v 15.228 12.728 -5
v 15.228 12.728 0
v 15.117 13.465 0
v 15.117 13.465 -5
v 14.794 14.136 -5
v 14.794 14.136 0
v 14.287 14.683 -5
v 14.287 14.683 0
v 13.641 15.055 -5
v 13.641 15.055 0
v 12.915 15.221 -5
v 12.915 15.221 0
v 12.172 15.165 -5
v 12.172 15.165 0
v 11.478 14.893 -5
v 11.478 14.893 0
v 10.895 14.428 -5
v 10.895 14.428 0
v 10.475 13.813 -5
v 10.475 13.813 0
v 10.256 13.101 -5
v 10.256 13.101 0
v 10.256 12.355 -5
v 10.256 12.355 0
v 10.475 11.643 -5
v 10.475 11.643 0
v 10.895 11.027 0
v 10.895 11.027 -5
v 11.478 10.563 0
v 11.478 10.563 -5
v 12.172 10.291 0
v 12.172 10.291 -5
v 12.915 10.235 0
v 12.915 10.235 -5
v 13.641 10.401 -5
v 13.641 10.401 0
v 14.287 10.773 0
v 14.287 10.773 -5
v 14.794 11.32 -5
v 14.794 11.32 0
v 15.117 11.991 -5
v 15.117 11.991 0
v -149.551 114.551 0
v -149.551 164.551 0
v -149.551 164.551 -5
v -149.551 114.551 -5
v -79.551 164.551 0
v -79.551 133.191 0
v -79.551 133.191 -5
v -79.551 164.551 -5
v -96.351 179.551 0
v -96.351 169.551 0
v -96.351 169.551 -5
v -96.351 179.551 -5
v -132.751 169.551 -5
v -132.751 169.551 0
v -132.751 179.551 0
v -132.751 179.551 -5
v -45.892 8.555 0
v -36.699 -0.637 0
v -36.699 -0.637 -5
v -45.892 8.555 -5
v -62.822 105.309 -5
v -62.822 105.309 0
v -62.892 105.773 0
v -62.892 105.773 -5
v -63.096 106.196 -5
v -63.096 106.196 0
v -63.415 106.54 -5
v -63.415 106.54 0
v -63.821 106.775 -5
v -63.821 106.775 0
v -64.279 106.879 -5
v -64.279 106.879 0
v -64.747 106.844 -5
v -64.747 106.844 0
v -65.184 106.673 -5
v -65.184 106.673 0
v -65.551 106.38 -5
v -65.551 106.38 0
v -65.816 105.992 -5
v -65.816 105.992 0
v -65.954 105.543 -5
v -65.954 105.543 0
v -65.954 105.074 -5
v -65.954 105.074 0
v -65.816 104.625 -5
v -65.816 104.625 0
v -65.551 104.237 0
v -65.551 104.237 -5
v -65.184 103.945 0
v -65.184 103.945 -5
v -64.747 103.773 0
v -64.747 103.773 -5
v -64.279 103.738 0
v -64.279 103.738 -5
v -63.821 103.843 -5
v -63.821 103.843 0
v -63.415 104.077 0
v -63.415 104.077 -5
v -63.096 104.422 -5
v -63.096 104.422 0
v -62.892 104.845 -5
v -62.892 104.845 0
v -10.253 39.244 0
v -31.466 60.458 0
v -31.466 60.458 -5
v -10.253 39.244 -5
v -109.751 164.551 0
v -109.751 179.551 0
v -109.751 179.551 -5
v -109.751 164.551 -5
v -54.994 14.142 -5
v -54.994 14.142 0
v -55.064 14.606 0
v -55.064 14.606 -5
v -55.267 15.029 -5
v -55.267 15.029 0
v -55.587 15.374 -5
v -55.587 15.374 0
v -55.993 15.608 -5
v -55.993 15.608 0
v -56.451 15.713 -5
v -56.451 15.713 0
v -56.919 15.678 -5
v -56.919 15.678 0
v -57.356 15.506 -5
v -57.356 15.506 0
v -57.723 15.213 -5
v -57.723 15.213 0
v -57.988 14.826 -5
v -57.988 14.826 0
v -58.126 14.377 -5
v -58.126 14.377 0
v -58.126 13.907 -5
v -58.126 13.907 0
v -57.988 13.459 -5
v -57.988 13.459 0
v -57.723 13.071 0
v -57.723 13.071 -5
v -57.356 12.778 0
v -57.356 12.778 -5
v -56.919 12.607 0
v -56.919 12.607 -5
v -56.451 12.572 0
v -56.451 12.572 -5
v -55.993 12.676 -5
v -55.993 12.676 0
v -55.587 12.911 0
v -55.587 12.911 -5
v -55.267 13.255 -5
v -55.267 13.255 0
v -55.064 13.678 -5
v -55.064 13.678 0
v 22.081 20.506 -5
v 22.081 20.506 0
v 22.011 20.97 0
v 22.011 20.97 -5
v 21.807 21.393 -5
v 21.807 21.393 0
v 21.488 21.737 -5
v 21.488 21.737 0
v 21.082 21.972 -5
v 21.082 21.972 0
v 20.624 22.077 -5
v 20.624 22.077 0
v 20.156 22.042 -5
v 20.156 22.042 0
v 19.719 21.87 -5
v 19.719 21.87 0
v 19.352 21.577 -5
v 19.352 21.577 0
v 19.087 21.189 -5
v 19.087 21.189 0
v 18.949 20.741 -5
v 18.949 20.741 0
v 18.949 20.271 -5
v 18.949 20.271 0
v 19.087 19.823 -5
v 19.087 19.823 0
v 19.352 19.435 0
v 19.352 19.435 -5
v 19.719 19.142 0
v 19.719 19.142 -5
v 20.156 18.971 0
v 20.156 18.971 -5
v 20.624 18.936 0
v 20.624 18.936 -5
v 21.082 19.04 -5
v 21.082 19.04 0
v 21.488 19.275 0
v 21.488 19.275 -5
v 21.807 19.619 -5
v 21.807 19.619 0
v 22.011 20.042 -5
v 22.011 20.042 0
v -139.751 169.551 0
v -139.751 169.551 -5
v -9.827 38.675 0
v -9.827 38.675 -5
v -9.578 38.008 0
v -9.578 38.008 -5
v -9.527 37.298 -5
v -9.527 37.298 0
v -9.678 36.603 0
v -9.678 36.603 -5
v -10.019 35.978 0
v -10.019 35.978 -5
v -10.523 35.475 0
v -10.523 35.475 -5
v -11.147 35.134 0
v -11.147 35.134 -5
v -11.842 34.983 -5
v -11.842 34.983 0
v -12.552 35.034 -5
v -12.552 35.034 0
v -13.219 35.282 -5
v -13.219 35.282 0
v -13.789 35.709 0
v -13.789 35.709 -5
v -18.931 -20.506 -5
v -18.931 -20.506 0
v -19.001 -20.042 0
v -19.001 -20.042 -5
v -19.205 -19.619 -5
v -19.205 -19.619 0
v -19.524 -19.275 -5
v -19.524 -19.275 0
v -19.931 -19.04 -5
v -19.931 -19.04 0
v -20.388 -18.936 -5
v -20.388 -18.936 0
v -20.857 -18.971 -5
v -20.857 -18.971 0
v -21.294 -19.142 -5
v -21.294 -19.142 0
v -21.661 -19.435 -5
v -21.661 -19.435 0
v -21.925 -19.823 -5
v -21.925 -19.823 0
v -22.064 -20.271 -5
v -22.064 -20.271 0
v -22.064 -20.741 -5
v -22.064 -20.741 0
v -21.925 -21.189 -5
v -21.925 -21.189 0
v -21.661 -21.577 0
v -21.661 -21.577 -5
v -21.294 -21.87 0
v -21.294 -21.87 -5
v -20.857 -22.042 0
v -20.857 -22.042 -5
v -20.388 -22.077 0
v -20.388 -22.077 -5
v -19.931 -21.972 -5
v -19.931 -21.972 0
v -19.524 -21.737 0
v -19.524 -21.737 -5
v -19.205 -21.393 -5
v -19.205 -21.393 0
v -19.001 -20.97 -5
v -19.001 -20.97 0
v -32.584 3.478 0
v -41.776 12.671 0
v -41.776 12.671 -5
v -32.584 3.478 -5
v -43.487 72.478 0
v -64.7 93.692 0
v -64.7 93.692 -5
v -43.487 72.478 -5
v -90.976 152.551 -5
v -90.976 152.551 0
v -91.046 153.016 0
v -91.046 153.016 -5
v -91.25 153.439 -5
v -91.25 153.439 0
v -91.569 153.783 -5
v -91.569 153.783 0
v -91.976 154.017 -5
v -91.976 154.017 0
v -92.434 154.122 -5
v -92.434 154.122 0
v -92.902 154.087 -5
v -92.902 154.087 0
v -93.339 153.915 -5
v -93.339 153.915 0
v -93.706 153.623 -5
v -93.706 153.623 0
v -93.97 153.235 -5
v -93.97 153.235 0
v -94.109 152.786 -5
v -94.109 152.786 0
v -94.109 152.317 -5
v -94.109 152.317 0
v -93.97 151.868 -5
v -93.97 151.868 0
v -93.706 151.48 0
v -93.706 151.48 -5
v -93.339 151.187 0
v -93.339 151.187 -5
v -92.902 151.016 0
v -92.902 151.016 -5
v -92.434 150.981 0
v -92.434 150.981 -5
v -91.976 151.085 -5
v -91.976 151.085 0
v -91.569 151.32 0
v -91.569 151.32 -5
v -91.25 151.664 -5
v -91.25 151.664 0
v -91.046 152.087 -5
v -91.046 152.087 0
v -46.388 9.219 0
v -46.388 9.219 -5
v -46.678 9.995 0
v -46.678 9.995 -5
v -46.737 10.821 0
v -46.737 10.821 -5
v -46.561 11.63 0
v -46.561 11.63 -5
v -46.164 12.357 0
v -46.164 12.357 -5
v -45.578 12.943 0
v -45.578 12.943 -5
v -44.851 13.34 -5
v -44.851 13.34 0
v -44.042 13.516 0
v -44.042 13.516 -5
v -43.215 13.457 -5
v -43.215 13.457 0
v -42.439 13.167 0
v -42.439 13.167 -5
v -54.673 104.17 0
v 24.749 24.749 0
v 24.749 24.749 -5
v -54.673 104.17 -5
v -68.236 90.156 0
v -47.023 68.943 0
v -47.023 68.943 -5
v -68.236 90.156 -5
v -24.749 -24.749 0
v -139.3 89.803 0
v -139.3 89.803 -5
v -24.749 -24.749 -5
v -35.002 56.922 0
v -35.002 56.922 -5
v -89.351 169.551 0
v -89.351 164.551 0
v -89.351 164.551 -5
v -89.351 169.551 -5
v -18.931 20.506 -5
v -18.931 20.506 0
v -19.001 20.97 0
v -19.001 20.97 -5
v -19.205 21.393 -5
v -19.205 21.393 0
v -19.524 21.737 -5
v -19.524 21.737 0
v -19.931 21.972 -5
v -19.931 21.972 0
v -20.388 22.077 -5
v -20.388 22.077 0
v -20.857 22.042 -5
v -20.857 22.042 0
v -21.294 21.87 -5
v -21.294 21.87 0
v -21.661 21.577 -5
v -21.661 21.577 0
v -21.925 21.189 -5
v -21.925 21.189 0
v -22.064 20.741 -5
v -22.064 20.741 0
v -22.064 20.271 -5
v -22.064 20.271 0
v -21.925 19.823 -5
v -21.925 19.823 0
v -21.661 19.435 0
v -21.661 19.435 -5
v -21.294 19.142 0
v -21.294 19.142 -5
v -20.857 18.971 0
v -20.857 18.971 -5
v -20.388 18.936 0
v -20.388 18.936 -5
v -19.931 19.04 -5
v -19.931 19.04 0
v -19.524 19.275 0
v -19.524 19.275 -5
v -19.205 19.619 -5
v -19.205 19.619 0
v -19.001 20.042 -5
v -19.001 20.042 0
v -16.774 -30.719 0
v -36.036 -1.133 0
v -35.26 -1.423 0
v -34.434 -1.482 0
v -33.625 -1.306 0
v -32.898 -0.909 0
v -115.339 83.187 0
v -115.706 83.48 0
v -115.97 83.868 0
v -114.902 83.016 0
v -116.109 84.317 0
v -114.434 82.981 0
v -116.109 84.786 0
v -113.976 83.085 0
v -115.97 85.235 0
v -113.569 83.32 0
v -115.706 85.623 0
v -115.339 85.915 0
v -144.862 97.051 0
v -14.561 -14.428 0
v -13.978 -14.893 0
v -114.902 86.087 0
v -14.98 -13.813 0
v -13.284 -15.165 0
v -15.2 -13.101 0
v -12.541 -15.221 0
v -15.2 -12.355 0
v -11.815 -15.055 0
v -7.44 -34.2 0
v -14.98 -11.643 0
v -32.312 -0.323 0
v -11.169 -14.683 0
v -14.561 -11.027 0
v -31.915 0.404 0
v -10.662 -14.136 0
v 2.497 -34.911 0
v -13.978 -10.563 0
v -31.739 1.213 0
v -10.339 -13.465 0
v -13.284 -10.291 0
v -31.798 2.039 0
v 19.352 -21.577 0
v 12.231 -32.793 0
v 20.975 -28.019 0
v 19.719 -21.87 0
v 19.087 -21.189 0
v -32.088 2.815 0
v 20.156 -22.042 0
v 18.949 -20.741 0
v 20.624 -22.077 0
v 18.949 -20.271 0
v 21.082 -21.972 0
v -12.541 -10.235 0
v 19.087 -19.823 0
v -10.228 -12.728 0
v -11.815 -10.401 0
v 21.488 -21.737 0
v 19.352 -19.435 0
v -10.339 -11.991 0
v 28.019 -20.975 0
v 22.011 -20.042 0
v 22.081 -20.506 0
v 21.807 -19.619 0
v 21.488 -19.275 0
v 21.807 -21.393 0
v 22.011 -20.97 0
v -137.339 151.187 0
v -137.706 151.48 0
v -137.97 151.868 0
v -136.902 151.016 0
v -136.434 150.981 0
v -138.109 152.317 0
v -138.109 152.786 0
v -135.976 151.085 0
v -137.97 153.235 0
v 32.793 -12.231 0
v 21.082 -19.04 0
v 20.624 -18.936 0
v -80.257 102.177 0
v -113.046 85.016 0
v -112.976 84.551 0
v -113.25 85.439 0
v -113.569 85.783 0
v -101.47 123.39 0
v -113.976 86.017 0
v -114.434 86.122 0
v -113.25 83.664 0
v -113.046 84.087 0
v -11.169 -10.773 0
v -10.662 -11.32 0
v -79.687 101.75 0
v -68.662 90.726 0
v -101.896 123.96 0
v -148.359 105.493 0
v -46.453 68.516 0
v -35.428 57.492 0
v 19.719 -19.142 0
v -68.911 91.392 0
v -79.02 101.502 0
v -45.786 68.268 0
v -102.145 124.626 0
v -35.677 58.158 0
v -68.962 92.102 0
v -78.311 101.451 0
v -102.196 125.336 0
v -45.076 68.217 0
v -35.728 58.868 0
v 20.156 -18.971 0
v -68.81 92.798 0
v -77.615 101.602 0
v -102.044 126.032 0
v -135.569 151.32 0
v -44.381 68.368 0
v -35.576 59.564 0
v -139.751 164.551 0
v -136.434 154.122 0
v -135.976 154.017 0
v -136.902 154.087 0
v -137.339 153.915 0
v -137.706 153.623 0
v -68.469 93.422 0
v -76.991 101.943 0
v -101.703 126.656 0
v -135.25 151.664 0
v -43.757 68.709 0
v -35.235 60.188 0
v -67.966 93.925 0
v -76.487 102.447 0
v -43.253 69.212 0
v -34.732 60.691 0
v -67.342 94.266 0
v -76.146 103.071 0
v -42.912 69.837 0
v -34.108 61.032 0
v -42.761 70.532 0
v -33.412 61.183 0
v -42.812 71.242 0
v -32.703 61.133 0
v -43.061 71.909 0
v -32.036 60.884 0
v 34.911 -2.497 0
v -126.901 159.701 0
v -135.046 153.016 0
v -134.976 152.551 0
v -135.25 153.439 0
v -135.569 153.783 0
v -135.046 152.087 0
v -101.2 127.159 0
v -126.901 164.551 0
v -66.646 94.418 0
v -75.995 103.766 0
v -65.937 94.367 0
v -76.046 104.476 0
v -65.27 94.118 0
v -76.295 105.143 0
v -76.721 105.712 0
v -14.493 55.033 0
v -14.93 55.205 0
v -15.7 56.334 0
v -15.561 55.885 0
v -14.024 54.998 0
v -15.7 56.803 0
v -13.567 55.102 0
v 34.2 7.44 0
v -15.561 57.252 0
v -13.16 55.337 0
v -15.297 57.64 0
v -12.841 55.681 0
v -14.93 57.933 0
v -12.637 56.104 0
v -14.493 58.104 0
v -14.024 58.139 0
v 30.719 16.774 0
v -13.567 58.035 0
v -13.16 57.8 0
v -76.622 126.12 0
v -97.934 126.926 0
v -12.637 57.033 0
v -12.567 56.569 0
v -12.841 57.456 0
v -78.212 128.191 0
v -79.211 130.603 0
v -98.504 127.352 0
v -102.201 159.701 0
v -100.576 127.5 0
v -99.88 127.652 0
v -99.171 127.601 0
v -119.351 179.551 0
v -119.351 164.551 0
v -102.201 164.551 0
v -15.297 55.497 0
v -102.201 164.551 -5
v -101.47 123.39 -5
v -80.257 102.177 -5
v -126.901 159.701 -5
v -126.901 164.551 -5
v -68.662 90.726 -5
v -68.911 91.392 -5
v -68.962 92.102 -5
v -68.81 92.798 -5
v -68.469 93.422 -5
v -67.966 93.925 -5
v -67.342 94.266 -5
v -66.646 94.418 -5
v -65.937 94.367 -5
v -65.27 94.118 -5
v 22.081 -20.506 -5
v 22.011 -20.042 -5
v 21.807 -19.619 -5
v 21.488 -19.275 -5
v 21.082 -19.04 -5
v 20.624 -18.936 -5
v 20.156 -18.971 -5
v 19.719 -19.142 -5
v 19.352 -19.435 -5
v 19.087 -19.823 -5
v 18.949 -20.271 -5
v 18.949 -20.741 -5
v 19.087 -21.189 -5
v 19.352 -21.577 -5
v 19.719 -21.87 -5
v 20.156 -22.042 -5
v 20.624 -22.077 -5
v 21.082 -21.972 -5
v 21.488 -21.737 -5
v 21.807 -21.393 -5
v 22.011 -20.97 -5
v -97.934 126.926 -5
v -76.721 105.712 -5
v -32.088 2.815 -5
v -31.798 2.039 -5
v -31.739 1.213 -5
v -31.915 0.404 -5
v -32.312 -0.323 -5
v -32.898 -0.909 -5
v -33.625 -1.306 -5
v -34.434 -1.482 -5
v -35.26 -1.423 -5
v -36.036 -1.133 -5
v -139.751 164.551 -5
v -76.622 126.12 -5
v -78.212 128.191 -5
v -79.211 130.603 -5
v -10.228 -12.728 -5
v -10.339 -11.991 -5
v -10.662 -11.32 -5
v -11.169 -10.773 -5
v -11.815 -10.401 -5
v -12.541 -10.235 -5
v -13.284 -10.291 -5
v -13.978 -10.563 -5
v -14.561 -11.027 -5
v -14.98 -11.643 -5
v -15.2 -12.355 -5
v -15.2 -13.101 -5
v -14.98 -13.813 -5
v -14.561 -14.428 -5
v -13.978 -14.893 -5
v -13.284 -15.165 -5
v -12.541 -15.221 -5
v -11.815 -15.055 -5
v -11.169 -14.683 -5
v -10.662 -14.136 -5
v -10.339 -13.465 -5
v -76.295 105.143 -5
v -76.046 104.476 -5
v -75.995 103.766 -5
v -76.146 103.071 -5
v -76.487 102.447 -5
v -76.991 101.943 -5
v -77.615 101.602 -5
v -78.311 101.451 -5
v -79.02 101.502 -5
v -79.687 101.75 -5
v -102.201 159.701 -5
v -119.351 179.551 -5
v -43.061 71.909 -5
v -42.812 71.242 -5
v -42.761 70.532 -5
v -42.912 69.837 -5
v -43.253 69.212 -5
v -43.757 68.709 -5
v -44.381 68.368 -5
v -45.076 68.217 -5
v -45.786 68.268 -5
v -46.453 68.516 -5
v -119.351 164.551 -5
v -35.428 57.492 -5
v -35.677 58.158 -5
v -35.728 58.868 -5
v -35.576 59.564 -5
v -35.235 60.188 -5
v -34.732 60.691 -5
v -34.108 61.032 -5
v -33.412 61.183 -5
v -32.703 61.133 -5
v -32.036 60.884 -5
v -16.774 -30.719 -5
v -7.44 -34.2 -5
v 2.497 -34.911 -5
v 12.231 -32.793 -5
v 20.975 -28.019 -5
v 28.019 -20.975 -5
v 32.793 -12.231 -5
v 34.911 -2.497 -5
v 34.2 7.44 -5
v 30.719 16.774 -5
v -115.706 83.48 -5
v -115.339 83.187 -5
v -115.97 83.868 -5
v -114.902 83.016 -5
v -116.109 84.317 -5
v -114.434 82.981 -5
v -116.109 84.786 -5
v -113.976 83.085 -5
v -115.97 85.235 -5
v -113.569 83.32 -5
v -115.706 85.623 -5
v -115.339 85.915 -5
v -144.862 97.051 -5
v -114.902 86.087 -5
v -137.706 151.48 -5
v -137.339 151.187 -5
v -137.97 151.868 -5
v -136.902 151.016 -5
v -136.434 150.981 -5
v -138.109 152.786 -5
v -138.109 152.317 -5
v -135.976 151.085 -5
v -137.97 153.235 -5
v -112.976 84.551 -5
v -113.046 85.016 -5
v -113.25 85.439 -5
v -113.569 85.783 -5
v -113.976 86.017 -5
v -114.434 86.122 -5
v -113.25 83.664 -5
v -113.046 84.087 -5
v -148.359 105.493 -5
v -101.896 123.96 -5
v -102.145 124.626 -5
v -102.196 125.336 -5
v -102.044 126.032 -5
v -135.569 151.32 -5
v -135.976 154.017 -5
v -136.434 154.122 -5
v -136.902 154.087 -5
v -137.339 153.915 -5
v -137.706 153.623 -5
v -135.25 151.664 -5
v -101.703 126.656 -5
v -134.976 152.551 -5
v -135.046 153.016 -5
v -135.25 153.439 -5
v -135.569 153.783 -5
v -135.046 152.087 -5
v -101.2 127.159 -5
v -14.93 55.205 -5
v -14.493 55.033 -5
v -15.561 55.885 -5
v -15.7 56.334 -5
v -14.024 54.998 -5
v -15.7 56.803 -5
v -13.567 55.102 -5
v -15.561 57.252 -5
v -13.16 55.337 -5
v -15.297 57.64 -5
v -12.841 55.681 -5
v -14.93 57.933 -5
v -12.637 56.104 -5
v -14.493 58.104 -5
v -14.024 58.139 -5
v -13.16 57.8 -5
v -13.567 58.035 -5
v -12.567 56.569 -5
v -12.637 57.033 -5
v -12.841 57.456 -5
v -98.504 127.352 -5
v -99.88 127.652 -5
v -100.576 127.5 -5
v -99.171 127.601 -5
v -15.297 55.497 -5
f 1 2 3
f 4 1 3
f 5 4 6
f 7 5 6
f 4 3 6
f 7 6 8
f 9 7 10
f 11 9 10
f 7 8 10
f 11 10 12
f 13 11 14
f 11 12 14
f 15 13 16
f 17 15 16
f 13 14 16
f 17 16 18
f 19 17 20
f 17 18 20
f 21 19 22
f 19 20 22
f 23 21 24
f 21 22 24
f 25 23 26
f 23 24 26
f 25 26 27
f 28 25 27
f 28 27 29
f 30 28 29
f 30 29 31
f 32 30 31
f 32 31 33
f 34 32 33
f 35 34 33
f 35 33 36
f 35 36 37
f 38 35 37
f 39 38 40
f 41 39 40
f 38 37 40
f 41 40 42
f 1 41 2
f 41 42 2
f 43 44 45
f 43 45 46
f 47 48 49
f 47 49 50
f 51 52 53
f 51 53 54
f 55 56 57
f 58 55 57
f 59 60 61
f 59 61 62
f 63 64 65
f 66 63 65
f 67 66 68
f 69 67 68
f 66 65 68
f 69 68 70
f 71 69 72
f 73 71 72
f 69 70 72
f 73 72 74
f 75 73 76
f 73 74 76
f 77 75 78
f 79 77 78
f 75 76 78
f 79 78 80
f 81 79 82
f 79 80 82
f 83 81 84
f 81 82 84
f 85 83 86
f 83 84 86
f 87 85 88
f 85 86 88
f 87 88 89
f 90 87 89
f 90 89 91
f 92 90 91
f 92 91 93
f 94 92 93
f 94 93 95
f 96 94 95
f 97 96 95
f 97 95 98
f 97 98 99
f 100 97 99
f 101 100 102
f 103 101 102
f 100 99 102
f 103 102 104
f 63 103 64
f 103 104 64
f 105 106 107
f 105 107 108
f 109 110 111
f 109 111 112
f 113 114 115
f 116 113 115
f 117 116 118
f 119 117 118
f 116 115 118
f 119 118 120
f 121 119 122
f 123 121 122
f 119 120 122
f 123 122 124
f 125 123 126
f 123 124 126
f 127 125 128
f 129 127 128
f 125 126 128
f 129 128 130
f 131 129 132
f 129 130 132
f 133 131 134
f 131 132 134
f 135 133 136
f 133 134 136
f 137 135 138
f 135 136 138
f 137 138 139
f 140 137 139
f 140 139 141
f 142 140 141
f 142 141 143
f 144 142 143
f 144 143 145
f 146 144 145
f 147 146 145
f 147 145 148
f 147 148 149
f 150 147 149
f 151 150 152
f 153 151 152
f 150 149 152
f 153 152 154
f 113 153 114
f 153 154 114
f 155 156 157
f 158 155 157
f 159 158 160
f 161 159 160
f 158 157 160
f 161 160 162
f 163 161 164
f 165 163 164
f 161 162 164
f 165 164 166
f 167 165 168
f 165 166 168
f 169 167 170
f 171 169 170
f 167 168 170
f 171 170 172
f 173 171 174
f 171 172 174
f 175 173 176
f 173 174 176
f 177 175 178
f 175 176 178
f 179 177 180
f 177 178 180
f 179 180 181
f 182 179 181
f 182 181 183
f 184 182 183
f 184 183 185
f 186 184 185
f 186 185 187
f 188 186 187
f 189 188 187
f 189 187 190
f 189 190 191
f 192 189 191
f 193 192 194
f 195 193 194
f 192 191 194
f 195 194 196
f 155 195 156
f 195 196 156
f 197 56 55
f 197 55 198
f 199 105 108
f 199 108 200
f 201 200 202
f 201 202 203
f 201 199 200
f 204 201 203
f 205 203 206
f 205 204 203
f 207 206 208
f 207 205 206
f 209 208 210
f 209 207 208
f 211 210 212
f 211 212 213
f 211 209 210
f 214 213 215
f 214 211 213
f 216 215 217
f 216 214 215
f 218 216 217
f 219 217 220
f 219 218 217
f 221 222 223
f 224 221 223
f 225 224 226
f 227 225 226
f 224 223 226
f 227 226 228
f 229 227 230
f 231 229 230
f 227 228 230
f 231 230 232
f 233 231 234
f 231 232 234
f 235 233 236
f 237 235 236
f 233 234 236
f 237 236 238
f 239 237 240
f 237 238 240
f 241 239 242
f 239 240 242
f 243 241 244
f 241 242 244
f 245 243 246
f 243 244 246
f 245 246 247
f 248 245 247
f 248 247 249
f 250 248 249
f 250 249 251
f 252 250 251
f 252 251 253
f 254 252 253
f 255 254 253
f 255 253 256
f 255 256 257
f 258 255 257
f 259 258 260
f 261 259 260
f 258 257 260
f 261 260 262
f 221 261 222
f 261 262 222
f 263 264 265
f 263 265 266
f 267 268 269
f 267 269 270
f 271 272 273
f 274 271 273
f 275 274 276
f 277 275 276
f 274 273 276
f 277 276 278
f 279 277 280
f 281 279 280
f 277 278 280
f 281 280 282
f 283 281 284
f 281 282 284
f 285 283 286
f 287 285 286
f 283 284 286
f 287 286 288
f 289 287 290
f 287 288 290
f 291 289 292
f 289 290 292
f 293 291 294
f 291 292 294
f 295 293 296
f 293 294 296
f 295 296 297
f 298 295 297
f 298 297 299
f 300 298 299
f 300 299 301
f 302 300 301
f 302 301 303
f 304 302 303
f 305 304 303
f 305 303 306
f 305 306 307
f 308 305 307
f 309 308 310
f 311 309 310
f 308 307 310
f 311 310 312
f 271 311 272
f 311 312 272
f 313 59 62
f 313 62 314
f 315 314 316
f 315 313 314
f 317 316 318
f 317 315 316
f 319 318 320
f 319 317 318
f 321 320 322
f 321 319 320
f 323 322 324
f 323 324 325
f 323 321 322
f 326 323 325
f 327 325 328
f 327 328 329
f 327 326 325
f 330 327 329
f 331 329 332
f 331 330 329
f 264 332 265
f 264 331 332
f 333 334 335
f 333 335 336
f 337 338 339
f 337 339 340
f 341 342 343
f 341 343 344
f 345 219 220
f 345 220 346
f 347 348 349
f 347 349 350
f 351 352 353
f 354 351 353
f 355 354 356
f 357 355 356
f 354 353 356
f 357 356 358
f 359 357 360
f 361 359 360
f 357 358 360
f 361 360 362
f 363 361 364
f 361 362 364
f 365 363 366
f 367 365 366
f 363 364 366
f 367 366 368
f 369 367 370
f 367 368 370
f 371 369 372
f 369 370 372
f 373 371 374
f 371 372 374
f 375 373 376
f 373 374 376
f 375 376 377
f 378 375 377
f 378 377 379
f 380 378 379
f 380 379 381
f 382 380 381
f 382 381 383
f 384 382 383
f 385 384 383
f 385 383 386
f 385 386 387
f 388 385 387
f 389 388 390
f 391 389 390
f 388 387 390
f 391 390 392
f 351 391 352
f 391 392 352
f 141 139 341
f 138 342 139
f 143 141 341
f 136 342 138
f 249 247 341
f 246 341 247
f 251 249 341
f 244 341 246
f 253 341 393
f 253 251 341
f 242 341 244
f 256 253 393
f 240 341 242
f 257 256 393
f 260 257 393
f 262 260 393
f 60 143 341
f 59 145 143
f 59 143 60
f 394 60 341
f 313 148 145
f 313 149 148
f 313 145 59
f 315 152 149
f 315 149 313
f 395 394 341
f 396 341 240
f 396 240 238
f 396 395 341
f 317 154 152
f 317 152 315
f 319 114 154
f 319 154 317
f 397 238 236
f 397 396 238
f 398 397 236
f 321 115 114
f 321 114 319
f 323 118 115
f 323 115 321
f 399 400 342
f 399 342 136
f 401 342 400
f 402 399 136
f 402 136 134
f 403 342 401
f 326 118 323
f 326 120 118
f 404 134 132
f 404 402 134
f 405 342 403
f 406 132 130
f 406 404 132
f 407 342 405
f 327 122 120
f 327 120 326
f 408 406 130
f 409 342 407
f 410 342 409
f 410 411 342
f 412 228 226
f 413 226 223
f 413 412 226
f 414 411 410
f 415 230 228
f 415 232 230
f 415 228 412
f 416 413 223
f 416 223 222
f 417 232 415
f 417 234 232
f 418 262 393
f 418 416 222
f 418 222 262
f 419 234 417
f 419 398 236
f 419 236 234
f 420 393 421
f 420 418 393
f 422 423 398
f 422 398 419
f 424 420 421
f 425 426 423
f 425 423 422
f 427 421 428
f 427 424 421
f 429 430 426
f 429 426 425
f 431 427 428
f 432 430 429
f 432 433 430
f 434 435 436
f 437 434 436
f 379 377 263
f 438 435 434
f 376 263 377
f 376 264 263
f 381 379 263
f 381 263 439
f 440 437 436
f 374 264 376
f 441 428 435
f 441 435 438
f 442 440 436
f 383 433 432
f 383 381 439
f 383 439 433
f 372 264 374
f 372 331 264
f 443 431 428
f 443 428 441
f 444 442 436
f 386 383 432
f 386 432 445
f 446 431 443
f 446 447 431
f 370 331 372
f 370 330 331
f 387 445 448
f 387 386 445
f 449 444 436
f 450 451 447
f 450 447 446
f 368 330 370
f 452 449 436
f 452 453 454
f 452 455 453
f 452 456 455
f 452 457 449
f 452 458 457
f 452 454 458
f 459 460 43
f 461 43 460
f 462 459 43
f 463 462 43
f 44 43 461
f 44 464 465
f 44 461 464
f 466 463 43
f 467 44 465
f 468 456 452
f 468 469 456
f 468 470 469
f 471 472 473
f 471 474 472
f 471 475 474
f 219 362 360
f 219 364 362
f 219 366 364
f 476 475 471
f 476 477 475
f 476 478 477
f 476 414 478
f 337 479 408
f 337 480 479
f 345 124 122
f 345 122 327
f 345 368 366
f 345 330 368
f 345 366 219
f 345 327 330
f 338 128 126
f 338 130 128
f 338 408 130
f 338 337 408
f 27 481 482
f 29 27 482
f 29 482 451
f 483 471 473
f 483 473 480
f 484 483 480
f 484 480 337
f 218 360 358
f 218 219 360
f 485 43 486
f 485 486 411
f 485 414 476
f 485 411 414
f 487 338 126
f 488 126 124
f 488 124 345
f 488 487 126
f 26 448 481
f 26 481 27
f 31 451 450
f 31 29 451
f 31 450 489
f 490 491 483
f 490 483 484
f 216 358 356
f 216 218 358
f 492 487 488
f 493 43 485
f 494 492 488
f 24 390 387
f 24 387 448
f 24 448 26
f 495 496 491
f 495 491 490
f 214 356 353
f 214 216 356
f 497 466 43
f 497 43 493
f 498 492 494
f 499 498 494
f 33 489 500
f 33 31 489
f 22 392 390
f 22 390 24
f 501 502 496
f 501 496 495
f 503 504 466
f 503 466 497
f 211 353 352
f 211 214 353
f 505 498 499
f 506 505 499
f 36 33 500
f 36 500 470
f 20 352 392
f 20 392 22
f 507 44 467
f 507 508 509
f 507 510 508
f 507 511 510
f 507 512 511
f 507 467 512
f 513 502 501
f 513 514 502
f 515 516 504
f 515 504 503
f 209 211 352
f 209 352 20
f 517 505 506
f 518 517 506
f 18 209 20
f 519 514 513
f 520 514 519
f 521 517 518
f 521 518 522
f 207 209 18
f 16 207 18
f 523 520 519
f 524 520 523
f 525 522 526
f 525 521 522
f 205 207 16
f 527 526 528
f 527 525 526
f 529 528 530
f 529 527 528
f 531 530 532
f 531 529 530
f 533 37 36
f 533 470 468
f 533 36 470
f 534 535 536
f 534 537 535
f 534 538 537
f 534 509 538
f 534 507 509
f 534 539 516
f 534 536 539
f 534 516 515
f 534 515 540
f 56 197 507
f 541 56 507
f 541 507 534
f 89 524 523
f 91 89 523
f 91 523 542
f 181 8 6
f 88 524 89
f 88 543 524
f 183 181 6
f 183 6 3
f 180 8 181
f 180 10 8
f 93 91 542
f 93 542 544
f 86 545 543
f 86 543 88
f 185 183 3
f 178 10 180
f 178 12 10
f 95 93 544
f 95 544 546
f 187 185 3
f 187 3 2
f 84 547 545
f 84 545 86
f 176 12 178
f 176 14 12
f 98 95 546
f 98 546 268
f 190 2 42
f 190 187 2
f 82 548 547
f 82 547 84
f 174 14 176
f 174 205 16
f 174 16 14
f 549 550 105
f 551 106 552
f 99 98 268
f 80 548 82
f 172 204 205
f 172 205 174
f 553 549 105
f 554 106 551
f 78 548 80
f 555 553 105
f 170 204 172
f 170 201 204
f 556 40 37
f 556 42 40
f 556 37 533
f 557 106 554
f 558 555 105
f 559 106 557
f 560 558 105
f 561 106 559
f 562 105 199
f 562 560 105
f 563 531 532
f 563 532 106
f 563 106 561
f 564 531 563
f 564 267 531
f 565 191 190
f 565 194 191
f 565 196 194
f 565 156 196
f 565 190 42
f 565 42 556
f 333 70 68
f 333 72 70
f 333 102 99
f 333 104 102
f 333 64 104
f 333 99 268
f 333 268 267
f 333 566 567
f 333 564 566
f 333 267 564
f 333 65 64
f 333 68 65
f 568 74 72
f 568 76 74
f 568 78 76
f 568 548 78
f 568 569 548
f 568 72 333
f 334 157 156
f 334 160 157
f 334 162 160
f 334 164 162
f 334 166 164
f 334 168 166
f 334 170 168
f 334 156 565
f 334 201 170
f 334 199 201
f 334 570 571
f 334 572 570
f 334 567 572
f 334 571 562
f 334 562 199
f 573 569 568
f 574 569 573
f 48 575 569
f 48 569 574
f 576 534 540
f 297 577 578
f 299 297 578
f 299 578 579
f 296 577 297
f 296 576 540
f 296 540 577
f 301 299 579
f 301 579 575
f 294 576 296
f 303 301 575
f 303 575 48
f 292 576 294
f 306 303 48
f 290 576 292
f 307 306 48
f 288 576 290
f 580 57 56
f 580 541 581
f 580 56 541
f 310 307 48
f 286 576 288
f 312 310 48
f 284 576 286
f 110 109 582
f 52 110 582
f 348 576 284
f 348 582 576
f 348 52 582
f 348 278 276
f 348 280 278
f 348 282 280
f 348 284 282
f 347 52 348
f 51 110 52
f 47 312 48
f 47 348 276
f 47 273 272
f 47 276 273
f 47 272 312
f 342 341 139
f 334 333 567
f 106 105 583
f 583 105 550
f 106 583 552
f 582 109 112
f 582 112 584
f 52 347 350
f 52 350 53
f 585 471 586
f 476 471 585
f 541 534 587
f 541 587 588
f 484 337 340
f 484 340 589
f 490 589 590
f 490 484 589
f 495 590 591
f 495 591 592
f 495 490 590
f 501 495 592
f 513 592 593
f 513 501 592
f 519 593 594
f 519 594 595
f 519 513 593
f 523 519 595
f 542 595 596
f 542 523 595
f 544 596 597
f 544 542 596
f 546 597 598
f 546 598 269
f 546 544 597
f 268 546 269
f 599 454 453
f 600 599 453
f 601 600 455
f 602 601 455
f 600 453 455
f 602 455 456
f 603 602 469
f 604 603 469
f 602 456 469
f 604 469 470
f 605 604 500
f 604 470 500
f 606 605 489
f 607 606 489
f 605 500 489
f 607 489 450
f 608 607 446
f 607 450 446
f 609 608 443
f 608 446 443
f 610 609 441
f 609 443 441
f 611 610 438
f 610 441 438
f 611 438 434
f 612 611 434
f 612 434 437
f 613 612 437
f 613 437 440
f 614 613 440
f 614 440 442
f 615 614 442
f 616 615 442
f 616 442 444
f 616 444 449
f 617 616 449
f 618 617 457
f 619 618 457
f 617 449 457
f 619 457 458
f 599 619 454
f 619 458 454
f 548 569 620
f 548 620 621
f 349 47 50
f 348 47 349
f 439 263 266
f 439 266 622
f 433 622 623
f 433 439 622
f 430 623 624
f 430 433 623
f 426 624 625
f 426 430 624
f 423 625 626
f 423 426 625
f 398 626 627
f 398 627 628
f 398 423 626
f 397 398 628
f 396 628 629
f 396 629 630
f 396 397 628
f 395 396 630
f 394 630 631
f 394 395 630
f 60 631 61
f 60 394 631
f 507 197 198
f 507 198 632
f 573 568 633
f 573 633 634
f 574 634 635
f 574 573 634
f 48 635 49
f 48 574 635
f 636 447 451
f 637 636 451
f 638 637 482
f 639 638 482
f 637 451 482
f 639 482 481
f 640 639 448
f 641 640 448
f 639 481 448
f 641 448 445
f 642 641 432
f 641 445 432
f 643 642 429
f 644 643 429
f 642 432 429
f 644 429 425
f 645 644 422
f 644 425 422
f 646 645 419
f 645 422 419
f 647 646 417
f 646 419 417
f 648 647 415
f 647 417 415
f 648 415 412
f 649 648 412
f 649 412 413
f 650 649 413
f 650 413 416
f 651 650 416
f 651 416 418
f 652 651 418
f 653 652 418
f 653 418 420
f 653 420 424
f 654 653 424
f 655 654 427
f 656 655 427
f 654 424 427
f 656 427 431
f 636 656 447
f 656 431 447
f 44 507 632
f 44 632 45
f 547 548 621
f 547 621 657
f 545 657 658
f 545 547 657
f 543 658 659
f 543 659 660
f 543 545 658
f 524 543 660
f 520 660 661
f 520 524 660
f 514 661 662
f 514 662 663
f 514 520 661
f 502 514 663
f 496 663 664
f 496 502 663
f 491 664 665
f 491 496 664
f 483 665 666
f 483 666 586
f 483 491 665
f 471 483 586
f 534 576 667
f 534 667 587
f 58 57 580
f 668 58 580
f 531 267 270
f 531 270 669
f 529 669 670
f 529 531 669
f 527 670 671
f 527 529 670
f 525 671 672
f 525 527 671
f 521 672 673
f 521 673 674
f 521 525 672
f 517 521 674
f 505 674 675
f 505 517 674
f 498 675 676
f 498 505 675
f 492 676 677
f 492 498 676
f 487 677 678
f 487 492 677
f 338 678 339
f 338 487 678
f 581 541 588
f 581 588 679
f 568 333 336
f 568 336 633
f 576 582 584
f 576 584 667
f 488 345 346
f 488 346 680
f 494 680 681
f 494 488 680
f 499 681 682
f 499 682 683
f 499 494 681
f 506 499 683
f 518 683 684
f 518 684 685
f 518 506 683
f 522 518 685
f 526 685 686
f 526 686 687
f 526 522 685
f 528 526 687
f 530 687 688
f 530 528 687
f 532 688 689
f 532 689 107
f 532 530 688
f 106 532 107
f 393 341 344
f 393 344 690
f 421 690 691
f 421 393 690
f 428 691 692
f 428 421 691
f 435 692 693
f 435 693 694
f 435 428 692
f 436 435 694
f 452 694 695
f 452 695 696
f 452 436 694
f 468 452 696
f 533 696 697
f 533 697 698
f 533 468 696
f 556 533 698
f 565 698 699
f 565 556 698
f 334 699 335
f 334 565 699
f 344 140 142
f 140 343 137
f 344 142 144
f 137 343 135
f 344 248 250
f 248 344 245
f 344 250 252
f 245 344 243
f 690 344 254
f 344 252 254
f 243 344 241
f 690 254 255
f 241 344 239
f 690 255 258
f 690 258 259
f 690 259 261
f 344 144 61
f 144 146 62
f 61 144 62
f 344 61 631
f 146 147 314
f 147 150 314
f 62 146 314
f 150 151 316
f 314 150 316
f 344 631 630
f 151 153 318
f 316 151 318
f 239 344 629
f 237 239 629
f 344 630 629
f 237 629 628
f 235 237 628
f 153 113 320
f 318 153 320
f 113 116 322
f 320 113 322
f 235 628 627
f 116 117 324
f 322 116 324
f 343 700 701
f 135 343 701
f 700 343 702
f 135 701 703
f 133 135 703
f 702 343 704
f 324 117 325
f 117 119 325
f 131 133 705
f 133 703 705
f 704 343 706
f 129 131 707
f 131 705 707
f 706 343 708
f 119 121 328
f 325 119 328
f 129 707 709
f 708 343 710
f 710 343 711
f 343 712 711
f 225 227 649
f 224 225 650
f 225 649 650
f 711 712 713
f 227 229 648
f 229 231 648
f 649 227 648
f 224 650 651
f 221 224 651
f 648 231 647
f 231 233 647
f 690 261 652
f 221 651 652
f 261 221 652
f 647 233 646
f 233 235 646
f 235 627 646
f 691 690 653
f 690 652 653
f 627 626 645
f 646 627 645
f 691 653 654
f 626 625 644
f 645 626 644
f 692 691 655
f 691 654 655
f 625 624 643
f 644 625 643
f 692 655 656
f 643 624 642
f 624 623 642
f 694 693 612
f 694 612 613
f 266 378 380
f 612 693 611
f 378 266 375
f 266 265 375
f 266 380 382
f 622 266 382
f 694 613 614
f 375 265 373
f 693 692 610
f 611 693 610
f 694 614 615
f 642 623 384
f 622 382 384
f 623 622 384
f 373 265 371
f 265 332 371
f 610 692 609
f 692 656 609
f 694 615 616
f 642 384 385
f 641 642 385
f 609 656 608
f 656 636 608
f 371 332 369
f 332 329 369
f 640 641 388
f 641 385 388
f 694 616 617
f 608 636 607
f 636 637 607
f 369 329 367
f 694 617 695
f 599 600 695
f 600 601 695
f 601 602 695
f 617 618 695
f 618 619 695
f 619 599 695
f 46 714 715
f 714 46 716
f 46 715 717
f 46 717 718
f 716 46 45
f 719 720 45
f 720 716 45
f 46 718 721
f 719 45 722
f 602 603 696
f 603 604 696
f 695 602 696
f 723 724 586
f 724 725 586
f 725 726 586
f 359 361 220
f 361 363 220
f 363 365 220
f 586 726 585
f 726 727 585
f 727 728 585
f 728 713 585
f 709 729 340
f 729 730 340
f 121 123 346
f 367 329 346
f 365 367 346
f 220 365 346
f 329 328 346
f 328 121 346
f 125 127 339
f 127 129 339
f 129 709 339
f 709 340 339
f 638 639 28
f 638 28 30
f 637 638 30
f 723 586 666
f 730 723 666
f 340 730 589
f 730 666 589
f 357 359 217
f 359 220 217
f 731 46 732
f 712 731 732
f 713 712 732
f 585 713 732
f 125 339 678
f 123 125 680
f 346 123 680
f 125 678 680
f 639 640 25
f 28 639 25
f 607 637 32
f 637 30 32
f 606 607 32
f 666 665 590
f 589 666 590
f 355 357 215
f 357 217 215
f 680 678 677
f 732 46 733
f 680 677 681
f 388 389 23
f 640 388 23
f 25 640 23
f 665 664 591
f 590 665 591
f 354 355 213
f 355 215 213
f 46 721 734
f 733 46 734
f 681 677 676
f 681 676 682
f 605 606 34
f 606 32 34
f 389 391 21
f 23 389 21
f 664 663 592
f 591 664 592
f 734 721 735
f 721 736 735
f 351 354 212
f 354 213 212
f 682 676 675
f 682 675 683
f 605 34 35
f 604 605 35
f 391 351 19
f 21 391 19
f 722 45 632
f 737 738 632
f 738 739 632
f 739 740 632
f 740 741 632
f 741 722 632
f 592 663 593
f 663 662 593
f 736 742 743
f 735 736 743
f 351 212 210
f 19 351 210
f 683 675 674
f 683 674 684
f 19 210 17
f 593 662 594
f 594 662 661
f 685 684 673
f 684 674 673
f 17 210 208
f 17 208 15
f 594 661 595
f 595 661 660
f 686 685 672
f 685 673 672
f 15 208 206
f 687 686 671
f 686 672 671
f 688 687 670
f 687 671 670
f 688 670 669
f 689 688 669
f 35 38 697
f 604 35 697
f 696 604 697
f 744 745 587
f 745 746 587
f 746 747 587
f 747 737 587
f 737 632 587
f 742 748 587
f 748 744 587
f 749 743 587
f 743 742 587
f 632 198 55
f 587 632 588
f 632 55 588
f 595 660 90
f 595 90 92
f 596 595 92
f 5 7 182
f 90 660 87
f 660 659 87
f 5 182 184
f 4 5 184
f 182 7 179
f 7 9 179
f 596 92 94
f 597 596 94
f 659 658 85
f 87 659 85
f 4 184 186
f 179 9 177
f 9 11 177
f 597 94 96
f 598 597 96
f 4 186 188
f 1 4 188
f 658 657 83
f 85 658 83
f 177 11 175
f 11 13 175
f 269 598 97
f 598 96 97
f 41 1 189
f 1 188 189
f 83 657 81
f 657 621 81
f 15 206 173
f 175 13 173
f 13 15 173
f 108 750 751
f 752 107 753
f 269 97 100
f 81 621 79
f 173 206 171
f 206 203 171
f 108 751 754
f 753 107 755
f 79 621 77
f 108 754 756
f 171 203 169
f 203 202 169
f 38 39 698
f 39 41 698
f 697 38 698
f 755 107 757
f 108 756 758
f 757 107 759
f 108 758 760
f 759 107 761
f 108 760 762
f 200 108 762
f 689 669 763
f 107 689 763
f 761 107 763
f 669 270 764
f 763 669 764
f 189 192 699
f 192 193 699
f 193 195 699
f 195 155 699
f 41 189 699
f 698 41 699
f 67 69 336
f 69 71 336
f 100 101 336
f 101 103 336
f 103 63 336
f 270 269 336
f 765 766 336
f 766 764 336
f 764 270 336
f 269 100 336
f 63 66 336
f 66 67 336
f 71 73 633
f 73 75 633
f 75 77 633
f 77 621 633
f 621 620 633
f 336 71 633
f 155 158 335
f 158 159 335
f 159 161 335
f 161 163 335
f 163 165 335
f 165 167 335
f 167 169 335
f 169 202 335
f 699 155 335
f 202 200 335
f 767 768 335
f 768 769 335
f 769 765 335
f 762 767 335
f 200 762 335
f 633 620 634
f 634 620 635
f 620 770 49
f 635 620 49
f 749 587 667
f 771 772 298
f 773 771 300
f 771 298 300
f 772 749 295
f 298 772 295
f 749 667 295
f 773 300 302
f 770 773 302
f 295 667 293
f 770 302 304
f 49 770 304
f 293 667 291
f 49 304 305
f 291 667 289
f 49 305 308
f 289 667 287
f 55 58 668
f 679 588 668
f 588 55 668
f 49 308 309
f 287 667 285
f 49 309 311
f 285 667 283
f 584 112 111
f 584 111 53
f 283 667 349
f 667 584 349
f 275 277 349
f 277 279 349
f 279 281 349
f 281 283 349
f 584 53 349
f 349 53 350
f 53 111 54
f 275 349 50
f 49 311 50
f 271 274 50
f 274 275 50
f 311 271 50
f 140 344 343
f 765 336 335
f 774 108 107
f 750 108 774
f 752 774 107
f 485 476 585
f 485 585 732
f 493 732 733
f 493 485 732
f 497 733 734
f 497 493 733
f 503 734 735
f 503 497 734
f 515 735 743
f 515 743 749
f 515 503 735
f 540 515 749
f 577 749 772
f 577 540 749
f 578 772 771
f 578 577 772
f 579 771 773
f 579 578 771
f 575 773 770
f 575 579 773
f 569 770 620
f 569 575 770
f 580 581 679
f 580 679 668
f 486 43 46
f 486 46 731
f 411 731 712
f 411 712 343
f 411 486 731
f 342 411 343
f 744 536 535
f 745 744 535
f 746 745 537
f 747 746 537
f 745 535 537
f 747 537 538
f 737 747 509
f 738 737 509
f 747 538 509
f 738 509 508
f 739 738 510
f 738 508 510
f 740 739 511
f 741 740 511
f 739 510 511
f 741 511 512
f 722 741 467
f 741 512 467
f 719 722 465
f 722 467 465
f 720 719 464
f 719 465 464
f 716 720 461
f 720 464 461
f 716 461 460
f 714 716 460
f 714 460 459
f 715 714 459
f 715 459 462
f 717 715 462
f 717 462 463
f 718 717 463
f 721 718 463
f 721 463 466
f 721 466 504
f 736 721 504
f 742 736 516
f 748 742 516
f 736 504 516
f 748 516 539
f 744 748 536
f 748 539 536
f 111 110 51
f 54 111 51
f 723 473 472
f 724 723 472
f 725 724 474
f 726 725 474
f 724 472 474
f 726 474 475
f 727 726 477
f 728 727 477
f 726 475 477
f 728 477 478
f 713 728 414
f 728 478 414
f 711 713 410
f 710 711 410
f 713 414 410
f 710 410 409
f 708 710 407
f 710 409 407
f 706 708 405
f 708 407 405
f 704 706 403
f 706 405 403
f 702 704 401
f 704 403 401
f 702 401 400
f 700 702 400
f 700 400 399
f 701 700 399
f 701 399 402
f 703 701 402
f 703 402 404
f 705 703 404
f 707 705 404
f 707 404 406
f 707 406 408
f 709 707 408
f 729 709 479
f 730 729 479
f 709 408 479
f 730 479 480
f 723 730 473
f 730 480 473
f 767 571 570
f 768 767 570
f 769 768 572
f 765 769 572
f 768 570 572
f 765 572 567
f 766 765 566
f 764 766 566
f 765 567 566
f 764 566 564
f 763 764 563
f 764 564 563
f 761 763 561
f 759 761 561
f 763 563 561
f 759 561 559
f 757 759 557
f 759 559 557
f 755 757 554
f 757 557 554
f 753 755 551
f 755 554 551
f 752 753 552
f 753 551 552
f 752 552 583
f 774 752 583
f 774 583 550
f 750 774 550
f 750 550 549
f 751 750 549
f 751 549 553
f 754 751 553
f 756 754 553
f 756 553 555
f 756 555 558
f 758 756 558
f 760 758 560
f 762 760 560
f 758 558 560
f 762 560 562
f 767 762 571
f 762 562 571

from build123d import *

# Parameters (mm, degrees)
SKETCH1_R           = 1.575
SKETCH1_R_2         = 2.5
BOSS_EXTRUDE1_DEPTH = 5
SKETCH3_W           = 13.4
SKETCH3_H           = 5
BOSS_EXTRUDE2_DEPTH = 5


with BuildPart() as part:
    # Sketch1 → Boss-Extrude1 (new body)
    with BuildSketch(Plane.XY):
        with BuildLine():
            Line((-139.300035894, 89.802561211), (-24.748737342, -24.748737342))
            ThreePointArc((-24.748737342, -24.748737342), (24.748737342, -24.748737342), (24.748737342, 24.748737342))
            Line((24.748737342, 24.748737342), (-54.672802234, 104.170276917))
            Line((-54.672802234, 104.170276917), (-76.622366364, 126.119841047))
            ThreePointArc((-76.622366364, 126.119841047), (-78.790093877, 129.364074535), (-79.551298552, 133.190908859))
            Line((-79.551298552, 133.190908859), (-79.551298552, 164.551298552))
            Line((-79.551298552, 164.551298552), (-89.351298552, 164.551298552))
            Line((-89.351298552, 164.551298552), (-89.351298552, 169.551298552))
            Line((-89.351298552, 169.551298552), (-96.351298552, 169.551298552))
            Line((-96.351298552, 169.551298552), (-96.351298552, 174.551298552))
            Line((-96.351298552, 174.551298552), (-109.751298552, 174.551298552))
            Line((-109.751298552, 174.551298552), (-109.751298552, 169.551298552))
            Line((-109.751298552, 169.551298552), (-109.751298552, 164.551298552))
            Line((-109.751298552, 164.551298552), (-102.201298552, 164.551298552))
            Line((-102.201298552, 164.551298552), (-102.201298552, 159.701298552))
            Line((-102.201298552, 159.701298552), (-126.901298552, 159.701298552))
            Line((-126.901298552, 159.701298552), (-126.901298552, 164.551298552))
            Line((-126.901298552, 164.551298552), (-119.351298552, 164.551298552))
            Line((-119.351298552, 164.551298552), (-119.351298552, 169.551298552))
            Line((-119.351298552, 169.551298552), (-119.351298552, 174.551298552))
            Line((-119.351298552, 174.551298552), (-132.751298552, 174.551298552))
            Line((-132.751298552, 174.551298552), (-132.751298552, 169.551298552))
            Line((-132.751298552, 169.551298552), (-139.751298552, 169.551298552))
            Line((-139.751298552, 169.551298552), (-139.751298552, 164.551298552))
            Line((-139.751298552, 164.551298552), (-149.551298552, 164.551298552))
            Line((-149.551298552, 164.551298552), (-149.551298552, 114.551298552))
            ThreePointArc((-149.551298552, 114.551298552), (-146.88708219, 101.157378419), (-139.300035894, 89.802561211))
        make_face()
        with Locations((-20.506096654, -20.506096654)):
            Circle(SKETCH1_R, mode=Mode.SUBTRACT)
        with Locations((-12.727922061, -12.727922061)):
            Circle(SKETCH1_R_2, mode=Mode.SUBTRACT)
        with Locations((-56.568542495, 14.142135624)):
            Circle(SKETCH1_R, mode=Mode.SUBTRACT)
        with BuildLine():
            ThreePointArc((-45.891723759, 8.555498392), (-45.891723759, 12.670859859), (-41.776362292, 12.670859859))
            Line((-41.776362292, 12.670859859), (-32.583974137, 3.478471704))
            ThreePointArc((-32.583974137, 3.478471704), (-32.583974137, -0.636889763), (-36.699335604, -0.636889763))
            Line((-36.699335604, -0.636889763), (-45.891723759, 8.555498392))
        make_face(mode=Mode.SUBTRACT)
        with Locations((20.506096654, -20.506096654)):
            Circle(SKETCH1_R, mode=Mode.SUBTRACT)
        with Locations((12.727922061, 12.727922061)):
            Circle(SKETCH1_R_2, mode=Mode.SUBTRACT)
        with Locations((-20.506096654, 20.506096654)):
            Circle(SKETCH1_R, mode=Mode.SUBTRACT)
        with BuildLine():
            ThreePointArc((-35.001785669, 56.922095886), (-35.001785669, 60.457629791), (-31.466251763, 60.457629791))
            Line((-31.466251763, 60.457629791), (-10.253048327, 39.244426356))
            ThreePointArc((-10.253048327, 39.244426356), (-10.253048327, 35.70889245), (-13.788582233, 35.70889245))
            Line((-13.788582233, 35.70889245), (-35.001785669, 56.922095886))
        make_face(mode=Mode.SUBTRACT)
        with Locations((-14.142135624, 56.568542495)):
            Circle(SKETCH1_R, mode=Mode.SUBTRACT)
        with Locations((20.506096654, 20.506096654)):
            Circle(SKETCH1_R, mode=Mode.SUBTRACT)
        with Locations((-114.551298552, 84.551298552)):
            Circle(SKETCH1_R, mode=Mode.SUBTRACT)
        with BuildLine():
            ThreePointArc((-101.4698231, 123.390133317), (-101.4698231, 126.925667223), (-97.934289194, 126.925667223))
            Line((-97.934289194, 126.925667223), (-76.721085759, 105.712463787))
            ThreePointArc((-76.721085759, 105.712463787), (-76.721085759, 102.176929881), (-80.256619665, 102.176929881))
            Line((-80.256619665, 102.176929881), (-101.4698231, 123.390133317))
        make_face(mode=Mode.SUBTRACT)
        with Locations((-64.396887007, 105.308740477)):
            Circle(SKETCH1_R, mode=Mode.SUBTRACT)
        with Locations((-136.551298552, 152.551298552)):
            Circle(SKETCH1_R, mode=Mode.SUBTRACT)
        with Locations((-92.551298552, 152.551298552)):
            Circle(SKETCH1_R, mode=Mode.SUBTRACT)
        with BuildLine():
            ThreePointArc((-68.235804384, 90.156114601), (-68.235804384, 93.691648507), (-64.700270479, 93.691648507))
            Line((-64.700270479, 93.691648507), (-43.487067043, 72.478445072))
            ThreePointArc((-43.487067043, 72.478445072), (-43.487067043, 68.942911166), (-47.022600949, 68.942911166))
            Line((-47.022600949, 68.942911166), (-68.235804384, 90.156114601))
        make_face(mode=Mode.SUBTRACT)
    extrude(amount=-BOSS_EXTRUDE1_DEPTH)

    # Sketch3 → Boss-Extrude2 (add)
    with BuildSketch(Plane.XY):
        with Locations((-126.051298552, 177.051298552)):
            Rectangle(SKETCH3_W, SKETCH3_H)
        with Locations((-103.051298552, 177.051298552)):
            Rectangle(SKETCH3_W, SKETCH3_H)
    extrude(amount=-BOSS_EXTRUDE2_DEPTH)


solid = part.part
